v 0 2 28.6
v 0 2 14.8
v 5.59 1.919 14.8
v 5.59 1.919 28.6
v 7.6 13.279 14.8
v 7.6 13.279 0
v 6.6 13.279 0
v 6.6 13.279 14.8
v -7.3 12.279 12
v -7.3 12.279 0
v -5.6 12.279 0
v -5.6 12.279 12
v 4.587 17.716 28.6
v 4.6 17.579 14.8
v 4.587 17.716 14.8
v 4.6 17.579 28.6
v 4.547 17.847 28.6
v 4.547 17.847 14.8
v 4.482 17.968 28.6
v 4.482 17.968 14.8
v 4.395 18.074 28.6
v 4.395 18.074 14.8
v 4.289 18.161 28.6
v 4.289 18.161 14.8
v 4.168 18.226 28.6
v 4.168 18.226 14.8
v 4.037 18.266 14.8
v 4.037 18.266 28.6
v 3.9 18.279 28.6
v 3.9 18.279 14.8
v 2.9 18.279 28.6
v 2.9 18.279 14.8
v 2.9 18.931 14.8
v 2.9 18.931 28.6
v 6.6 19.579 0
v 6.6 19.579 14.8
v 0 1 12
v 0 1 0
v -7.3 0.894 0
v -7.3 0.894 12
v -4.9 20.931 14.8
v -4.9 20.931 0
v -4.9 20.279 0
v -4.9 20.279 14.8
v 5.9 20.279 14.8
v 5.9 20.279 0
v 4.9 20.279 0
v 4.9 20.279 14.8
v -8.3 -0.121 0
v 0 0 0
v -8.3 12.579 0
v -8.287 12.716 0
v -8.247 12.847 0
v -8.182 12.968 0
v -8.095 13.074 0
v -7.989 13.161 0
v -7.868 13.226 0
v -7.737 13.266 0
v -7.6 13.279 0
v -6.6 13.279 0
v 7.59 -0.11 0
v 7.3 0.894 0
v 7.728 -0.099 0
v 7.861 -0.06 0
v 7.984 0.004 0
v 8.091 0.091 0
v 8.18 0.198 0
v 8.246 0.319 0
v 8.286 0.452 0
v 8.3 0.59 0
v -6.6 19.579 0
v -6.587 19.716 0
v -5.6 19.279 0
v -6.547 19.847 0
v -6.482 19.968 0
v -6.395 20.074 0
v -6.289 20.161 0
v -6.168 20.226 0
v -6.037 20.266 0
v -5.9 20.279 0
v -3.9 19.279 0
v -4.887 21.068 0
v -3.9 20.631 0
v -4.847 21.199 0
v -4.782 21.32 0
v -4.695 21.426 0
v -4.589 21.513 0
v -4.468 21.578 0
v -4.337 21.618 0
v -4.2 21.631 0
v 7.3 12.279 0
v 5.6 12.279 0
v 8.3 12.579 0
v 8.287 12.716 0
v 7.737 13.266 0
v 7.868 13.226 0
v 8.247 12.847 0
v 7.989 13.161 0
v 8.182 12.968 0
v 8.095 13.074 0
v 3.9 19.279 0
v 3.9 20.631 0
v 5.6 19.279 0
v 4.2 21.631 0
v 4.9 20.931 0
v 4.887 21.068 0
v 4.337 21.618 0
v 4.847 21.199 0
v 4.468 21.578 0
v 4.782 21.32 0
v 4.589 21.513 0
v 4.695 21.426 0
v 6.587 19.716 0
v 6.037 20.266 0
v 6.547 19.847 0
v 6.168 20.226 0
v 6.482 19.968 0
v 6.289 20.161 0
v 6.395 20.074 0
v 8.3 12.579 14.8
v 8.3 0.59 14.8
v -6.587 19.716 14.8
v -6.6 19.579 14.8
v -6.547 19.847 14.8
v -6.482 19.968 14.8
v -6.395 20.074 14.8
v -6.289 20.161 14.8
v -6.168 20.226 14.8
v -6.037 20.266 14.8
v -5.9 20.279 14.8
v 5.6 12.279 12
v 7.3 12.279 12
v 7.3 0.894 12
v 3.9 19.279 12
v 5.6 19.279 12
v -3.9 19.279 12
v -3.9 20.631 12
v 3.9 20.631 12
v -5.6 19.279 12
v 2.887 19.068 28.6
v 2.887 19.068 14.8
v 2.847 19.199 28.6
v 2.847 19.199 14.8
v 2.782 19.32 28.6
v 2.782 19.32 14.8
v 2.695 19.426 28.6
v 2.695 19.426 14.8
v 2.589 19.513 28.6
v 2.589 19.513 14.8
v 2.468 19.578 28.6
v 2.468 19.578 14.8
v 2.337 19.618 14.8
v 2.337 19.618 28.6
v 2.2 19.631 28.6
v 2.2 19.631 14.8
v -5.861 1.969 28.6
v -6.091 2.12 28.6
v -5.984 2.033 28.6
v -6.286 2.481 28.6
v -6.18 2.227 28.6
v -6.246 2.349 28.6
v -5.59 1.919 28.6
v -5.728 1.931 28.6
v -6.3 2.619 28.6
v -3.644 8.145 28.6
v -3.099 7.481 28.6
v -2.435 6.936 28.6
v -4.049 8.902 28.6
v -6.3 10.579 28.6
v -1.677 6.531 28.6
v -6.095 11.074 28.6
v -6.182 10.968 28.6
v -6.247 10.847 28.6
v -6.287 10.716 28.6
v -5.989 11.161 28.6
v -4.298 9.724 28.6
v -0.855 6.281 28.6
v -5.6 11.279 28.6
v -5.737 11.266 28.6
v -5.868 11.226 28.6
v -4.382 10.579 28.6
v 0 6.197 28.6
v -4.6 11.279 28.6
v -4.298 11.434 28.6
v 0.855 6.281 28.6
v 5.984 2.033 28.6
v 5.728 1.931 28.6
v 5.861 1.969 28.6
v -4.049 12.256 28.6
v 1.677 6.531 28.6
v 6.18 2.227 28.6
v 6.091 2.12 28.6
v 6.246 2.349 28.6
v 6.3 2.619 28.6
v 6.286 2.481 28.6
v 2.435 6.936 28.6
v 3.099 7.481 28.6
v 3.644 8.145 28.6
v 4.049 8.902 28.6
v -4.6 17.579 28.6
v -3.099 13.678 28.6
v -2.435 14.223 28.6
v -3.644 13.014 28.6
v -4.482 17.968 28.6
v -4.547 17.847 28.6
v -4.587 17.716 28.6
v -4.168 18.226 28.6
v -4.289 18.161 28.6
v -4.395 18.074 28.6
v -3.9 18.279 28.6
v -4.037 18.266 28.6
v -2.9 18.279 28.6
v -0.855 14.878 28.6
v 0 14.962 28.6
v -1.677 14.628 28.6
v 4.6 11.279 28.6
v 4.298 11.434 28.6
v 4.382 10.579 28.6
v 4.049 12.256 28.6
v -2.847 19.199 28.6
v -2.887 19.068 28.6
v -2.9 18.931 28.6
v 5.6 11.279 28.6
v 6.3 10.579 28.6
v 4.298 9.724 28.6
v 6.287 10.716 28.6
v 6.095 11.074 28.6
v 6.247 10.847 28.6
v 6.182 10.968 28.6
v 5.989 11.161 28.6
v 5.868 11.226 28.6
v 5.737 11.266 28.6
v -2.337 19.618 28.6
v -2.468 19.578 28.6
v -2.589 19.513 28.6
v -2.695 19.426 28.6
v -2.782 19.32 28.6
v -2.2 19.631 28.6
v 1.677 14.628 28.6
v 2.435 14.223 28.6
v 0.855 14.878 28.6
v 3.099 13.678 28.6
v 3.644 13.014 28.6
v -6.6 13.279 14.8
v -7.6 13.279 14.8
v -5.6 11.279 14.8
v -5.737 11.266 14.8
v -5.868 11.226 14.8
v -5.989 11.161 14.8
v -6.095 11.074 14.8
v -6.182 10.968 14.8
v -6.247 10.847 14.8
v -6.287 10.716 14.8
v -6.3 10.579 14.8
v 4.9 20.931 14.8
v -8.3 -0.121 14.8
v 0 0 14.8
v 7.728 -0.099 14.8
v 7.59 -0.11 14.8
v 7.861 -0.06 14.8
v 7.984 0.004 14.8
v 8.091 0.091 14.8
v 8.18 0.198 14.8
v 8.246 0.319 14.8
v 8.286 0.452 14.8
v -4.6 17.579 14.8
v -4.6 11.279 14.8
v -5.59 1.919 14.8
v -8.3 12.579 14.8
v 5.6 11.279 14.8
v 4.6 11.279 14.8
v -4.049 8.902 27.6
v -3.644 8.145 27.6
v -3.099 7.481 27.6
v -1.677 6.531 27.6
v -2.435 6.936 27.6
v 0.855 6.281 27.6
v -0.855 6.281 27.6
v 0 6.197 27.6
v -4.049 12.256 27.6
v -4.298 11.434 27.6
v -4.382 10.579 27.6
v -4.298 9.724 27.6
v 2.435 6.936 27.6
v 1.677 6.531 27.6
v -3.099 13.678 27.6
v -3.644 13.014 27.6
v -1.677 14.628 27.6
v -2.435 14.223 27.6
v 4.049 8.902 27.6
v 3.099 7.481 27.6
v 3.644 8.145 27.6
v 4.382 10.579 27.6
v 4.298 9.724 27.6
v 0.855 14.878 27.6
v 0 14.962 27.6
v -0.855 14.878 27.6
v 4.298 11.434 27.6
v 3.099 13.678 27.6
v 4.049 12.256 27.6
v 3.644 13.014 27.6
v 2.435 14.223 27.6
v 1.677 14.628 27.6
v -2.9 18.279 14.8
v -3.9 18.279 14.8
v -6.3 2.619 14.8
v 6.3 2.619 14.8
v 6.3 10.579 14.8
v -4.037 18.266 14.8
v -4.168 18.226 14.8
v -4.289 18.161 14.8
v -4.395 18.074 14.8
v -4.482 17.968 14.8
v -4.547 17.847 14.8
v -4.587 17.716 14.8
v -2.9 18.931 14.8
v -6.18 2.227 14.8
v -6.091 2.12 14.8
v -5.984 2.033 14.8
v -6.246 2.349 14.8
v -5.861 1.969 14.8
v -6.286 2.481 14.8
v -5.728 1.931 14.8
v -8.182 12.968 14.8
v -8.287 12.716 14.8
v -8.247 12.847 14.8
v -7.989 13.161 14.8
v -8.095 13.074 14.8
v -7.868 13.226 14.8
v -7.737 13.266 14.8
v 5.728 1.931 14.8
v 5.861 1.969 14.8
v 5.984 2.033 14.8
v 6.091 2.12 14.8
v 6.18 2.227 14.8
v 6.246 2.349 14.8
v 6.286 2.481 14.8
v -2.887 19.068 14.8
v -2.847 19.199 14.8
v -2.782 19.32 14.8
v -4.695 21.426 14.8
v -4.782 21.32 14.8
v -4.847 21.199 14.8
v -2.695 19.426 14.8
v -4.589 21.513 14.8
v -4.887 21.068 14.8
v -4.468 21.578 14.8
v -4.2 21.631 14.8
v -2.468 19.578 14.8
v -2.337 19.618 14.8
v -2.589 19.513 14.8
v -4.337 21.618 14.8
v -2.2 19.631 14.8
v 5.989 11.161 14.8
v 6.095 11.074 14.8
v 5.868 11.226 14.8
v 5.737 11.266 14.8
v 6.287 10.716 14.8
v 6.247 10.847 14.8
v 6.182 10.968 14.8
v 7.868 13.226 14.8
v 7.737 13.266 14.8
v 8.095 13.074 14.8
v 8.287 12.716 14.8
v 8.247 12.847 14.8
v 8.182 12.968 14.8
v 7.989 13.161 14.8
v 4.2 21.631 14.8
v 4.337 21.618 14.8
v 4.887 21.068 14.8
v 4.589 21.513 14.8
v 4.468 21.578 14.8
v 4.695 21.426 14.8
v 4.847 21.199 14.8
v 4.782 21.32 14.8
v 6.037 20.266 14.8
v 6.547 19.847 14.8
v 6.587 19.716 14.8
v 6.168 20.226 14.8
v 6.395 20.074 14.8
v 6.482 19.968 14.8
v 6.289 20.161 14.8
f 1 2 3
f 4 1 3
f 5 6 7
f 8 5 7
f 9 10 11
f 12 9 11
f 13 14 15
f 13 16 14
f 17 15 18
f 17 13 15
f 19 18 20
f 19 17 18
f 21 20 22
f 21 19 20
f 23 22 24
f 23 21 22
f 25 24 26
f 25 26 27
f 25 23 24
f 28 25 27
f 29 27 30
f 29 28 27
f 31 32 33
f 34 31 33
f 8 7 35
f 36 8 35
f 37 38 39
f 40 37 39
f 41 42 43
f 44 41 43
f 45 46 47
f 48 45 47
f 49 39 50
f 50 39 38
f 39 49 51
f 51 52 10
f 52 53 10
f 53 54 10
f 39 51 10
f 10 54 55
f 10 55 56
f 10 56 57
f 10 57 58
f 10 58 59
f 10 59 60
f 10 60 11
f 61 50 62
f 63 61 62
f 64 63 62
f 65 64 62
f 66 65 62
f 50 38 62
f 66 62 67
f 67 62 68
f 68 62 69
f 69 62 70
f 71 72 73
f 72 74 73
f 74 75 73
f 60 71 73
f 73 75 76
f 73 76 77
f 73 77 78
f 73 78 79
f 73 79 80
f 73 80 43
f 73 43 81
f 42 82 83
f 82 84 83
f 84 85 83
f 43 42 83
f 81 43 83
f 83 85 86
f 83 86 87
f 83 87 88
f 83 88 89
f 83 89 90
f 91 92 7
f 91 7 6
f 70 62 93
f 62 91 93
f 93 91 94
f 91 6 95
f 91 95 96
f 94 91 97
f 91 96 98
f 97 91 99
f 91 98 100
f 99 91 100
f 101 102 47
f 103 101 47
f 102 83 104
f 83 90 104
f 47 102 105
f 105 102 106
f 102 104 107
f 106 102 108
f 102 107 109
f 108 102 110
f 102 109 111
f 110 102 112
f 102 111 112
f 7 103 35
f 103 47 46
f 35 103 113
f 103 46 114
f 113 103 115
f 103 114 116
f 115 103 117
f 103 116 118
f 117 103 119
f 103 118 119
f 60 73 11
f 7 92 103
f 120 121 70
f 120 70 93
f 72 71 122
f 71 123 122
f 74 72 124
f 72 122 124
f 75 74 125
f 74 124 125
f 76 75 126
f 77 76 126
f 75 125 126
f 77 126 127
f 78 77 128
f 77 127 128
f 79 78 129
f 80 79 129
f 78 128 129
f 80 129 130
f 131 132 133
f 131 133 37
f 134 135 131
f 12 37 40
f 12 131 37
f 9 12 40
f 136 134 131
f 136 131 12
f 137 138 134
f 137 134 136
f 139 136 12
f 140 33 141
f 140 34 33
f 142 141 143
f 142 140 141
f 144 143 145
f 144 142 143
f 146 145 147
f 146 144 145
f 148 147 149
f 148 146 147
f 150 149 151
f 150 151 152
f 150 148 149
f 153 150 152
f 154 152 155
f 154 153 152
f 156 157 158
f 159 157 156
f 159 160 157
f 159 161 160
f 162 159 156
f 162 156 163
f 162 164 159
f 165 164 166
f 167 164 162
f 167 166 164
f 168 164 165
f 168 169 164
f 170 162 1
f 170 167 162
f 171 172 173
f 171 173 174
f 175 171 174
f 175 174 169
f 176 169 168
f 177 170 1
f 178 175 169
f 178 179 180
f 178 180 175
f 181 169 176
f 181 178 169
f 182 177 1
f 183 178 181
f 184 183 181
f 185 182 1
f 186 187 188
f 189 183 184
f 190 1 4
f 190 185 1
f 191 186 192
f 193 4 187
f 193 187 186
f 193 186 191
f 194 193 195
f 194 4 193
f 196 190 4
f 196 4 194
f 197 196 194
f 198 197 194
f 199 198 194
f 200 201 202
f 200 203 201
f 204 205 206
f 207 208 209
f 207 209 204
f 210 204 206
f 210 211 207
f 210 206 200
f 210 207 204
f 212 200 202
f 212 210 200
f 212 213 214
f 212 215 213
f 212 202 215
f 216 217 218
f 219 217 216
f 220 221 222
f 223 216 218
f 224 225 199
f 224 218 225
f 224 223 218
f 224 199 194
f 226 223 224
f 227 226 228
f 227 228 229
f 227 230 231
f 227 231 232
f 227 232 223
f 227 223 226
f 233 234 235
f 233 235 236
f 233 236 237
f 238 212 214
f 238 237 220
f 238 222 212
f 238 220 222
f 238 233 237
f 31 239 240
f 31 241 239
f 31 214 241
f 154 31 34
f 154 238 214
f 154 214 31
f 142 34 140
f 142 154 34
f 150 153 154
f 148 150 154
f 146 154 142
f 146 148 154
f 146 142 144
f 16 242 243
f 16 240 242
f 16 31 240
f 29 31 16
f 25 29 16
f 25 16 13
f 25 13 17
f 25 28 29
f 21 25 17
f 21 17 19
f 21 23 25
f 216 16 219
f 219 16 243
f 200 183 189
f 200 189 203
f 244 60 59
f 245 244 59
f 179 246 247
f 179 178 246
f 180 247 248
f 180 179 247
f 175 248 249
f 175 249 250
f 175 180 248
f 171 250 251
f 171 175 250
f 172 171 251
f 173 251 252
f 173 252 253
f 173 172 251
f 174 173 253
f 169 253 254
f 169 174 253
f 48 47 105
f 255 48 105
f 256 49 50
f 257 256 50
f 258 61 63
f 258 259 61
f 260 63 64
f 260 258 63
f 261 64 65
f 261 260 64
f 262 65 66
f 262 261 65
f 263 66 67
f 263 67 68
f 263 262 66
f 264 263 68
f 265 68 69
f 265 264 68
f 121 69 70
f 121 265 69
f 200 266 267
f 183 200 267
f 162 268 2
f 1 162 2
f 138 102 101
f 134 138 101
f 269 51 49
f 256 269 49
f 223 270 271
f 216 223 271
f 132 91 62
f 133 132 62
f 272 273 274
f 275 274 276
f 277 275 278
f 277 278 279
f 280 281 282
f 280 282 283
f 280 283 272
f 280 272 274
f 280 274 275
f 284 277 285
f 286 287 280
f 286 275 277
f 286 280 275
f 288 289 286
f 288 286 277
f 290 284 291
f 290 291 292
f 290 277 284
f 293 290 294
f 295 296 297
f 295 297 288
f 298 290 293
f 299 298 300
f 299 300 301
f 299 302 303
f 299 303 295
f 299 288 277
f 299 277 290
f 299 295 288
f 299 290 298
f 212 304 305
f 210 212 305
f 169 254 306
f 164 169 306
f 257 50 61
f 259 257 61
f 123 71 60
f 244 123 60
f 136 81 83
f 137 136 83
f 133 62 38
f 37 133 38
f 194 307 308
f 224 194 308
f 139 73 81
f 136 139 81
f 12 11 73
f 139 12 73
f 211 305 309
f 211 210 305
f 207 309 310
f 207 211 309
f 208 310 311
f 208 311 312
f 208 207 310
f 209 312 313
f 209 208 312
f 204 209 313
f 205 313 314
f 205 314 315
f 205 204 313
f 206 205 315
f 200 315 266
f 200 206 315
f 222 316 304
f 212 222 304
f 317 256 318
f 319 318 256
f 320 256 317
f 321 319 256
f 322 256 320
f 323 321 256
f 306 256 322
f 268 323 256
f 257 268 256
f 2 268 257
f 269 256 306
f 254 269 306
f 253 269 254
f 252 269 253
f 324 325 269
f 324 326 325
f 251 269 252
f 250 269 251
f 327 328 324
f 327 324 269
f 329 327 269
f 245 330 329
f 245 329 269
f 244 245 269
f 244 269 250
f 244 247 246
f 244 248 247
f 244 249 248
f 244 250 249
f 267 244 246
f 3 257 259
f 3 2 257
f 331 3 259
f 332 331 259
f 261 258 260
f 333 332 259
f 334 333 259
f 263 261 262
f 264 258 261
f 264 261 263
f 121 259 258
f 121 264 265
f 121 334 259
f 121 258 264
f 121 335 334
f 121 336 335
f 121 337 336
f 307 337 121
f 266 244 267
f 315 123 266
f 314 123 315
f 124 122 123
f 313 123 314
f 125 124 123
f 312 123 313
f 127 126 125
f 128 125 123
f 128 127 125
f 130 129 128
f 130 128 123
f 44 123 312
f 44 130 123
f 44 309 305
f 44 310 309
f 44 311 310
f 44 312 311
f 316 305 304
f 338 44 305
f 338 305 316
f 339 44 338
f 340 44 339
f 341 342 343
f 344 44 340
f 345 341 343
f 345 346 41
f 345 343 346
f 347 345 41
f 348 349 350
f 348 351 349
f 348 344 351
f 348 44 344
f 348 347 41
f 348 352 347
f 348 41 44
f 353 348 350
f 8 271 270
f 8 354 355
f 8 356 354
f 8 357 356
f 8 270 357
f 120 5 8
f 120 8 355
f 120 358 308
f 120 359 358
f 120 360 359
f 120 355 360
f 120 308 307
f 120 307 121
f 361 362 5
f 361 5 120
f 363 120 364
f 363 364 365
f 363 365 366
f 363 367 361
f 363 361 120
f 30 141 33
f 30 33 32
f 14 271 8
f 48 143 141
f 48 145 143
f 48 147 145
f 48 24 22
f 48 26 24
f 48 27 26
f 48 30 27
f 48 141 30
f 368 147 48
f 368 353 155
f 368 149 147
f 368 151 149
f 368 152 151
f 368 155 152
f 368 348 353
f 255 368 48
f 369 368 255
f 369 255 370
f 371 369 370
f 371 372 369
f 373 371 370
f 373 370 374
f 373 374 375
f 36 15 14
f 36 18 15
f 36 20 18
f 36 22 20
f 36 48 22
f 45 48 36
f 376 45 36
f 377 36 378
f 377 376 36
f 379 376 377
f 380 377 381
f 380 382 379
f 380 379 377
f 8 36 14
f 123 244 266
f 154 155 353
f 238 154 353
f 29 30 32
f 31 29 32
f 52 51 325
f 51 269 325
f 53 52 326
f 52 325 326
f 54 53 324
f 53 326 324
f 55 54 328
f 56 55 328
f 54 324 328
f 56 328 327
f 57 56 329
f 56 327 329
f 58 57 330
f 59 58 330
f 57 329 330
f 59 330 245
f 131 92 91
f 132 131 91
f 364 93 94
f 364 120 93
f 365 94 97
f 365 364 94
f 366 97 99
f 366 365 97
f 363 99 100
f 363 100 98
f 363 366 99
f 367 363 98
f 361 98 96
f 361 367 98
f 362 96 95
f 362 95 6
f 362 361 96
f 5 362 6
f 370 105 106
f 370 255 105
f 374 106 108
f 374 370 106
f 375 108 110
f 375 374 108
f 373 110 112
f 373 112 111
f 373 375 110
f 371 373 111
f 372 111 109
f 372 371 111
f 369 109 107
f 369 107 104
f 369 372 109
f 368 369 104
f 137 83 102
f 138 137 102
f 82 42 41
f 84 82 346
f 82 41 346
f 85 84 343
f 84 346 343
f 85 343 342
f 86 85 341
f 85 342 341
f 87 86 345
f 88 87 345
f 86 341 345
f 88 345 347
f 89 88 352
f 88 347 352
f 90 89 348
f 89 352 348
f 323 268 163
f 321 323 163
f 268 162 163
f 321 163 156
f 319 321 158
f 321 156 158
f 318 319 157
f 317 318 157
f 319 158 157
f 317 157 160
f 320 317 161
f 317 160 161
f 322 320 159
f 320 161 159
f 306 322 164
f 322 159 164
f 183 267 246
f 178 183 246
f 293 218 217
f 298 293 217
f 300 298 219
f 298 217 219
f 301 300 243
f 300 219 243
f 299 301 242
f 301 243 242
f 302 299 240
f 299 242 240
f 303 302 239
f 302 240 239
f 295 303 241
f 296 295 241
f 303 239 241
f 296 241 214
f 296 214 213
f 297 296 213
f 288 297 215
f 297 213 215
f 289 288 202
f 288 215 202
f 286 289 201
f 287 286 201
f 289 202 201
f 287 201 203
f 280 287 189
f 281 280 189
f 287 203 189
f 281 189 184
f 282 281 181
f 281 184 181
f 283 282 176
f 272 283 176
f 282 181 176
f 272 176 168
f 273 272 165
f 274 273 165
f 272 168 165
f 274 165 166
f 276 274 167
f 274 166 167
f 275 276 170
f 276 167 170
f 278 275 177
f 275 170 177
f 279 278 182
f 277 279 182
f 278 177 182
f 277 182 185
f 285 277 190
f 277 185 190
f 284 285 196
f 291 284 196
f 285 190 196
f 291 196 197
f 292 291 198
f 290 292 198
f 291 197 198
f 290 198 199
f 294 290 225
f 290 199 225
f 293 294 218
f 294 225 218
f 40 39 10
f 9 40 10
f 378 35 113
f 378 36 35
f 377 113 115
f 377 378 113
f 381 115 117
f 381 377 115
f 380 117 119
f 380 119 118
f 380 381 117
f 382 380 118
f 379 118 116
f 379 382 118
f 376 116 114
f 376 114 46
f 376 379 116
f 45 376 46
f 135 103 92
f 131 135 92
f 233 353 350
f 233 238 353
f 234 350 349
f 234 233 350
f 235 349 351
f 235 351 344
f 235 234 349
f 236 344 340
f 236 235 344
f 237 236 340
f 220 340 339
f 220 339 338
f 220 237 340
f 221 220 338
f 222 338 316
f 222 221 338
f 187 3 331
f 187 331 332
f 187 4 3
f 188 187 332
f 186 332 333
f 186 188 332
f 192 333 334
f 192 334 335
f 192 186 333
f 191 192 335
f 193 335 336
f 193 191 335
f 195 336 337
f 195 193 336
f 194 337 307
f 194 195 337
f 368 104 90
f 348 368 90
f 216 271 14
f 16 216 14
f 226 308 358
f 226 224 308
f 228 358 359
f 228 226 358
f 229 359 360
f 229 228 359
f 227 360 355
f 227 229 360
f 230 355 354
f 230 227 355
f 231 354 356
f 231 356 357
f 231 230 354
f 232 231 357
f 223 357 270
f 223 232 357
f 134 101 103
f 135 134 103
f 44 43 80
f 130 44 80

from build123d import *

# Parameters (mm, degrees)
EXTRUDE_1_DEPTH     = 14.8
EXTRUDE_2_DEPTH     = 13.8
CUT_EXTRUDE_1_DEPTH = 12
FILLET_1_R          = 0.7
SKETCH_4_R          = 4.382397862
CUT_EXTRUDE_2_DEPTH = 1


with BuildPart() as part:
    # ｽｹｯﾁ1 → ﾎﾞｽ - 押し出し1 (new body)
    with BuildSketch(Plane.XY):
        Polygon((0, 0), (8.3, -0.120571415), (8.3, 13.279428585), (6.6, 13.279428585), (6.6, 20.279428585), (4.9, 20.279428585), (4.9, 21.63120639), (-4.9, 21.63120639), (-4.9, 20.279428585), (-6.6, 20.279428585), (-6.6, 13.279428585), (-8.3, 13.279428585), (-8.3, -0.120571415), align=None)
    extrude(amount=EXTRUDE_1_DEPTH)

    # ｽｹｯﾁ2 → ﾎﾞｽ - 押し出し2 (add)
    with BuildSketch(Plane.XY.offset(14.8)):
        Polygon((-6.3, 1.908692951), (0, 2.000211013), (6.3, 1.908692951), (6.3, 11.279428585), (4.6, 11.279428585), (4.6, 18.279428585), (2.9, 18.279428585), (2.9, 19.63120639), (-2.9, 19.63120639), (-2.9, 18.279428585), (-4.6, 18.279428585), (-4.6, 11.279428585), (-6.3, 11.279428585), align=None)
    extrude(amount=EXTRUDE_2_DEPTH)

    # ｽｹｯﾁ3 → ｶｯﾄ - 押し出し1 (cut)
    with BuildSketch(Plane(origin=(0, 0, 0), x_dir=(-1, 0, 0), z_dir=(0, 0, -1))):
        Polygon((0, 1.000105507), (7.3, 0.894060768), (7.3, 12.279428585), (5.6, 12.279428585), (5.6, 19.279428585), (3.9, 19.279428585), (3.9, 20.63120639), (-3.9, 20.63120639), (-3.9, 19.279428585), (-5.6, 19.279428585), (-5.6, 12.279428585), (-7.3, 12.279428585), (-7.3, 0.894060768), align=None)
    extrude(amount=-CUT_EXTRUDE_1_DEPTH, mode=Mode.SUBTRACT)

    # ﾌｨﾚｯﾄ1
    fillet_1_edges = [part.edges().sort_by_distance(p)[0] for p in [
        (-8.3, 13.279428585, 7.4),
        (-6.6, 20.279428585, 7.4),
        (-4.9, 21.63120639, 7.4),
        (4.9, 21.63120639, 7.4),
        (6.6, 20.279428585, 7.4),
        (8.3, 13.279428585, 7.4),
        (8.3, -0.120571415, 7.4),
        (-6.3, 11.279428585, 21.7),
        (-6.3, 1.908692951, 21.7),
        (6.3, 1.908692951, 21.7),
        (6.3, 11.279428585, 21.7),
        (4.6, 18.279428585, 21.7),
        (2.9, 19.63120639, 21.7),
        (-2.9, 19.63120639, 21.7),
        (-4.6, 18.279428585, 21.7),
    ]]
    fillet(fillet_1_edges, radius=FILLET_1_R)

    # ｽｹｯﾁ4 → ｶｯﾄ - 押し出し2 (cut)
    with BuildSketch(Plane.XY.offset(28.6)):
        with Locations((0, 10.579428585)):
            Circle(SKETCH_4_R)
    extrude(amount=-CUT_EXTRUDE_2_DEPTH, mode=Mode.SUBTRACT)


solid = part.part
